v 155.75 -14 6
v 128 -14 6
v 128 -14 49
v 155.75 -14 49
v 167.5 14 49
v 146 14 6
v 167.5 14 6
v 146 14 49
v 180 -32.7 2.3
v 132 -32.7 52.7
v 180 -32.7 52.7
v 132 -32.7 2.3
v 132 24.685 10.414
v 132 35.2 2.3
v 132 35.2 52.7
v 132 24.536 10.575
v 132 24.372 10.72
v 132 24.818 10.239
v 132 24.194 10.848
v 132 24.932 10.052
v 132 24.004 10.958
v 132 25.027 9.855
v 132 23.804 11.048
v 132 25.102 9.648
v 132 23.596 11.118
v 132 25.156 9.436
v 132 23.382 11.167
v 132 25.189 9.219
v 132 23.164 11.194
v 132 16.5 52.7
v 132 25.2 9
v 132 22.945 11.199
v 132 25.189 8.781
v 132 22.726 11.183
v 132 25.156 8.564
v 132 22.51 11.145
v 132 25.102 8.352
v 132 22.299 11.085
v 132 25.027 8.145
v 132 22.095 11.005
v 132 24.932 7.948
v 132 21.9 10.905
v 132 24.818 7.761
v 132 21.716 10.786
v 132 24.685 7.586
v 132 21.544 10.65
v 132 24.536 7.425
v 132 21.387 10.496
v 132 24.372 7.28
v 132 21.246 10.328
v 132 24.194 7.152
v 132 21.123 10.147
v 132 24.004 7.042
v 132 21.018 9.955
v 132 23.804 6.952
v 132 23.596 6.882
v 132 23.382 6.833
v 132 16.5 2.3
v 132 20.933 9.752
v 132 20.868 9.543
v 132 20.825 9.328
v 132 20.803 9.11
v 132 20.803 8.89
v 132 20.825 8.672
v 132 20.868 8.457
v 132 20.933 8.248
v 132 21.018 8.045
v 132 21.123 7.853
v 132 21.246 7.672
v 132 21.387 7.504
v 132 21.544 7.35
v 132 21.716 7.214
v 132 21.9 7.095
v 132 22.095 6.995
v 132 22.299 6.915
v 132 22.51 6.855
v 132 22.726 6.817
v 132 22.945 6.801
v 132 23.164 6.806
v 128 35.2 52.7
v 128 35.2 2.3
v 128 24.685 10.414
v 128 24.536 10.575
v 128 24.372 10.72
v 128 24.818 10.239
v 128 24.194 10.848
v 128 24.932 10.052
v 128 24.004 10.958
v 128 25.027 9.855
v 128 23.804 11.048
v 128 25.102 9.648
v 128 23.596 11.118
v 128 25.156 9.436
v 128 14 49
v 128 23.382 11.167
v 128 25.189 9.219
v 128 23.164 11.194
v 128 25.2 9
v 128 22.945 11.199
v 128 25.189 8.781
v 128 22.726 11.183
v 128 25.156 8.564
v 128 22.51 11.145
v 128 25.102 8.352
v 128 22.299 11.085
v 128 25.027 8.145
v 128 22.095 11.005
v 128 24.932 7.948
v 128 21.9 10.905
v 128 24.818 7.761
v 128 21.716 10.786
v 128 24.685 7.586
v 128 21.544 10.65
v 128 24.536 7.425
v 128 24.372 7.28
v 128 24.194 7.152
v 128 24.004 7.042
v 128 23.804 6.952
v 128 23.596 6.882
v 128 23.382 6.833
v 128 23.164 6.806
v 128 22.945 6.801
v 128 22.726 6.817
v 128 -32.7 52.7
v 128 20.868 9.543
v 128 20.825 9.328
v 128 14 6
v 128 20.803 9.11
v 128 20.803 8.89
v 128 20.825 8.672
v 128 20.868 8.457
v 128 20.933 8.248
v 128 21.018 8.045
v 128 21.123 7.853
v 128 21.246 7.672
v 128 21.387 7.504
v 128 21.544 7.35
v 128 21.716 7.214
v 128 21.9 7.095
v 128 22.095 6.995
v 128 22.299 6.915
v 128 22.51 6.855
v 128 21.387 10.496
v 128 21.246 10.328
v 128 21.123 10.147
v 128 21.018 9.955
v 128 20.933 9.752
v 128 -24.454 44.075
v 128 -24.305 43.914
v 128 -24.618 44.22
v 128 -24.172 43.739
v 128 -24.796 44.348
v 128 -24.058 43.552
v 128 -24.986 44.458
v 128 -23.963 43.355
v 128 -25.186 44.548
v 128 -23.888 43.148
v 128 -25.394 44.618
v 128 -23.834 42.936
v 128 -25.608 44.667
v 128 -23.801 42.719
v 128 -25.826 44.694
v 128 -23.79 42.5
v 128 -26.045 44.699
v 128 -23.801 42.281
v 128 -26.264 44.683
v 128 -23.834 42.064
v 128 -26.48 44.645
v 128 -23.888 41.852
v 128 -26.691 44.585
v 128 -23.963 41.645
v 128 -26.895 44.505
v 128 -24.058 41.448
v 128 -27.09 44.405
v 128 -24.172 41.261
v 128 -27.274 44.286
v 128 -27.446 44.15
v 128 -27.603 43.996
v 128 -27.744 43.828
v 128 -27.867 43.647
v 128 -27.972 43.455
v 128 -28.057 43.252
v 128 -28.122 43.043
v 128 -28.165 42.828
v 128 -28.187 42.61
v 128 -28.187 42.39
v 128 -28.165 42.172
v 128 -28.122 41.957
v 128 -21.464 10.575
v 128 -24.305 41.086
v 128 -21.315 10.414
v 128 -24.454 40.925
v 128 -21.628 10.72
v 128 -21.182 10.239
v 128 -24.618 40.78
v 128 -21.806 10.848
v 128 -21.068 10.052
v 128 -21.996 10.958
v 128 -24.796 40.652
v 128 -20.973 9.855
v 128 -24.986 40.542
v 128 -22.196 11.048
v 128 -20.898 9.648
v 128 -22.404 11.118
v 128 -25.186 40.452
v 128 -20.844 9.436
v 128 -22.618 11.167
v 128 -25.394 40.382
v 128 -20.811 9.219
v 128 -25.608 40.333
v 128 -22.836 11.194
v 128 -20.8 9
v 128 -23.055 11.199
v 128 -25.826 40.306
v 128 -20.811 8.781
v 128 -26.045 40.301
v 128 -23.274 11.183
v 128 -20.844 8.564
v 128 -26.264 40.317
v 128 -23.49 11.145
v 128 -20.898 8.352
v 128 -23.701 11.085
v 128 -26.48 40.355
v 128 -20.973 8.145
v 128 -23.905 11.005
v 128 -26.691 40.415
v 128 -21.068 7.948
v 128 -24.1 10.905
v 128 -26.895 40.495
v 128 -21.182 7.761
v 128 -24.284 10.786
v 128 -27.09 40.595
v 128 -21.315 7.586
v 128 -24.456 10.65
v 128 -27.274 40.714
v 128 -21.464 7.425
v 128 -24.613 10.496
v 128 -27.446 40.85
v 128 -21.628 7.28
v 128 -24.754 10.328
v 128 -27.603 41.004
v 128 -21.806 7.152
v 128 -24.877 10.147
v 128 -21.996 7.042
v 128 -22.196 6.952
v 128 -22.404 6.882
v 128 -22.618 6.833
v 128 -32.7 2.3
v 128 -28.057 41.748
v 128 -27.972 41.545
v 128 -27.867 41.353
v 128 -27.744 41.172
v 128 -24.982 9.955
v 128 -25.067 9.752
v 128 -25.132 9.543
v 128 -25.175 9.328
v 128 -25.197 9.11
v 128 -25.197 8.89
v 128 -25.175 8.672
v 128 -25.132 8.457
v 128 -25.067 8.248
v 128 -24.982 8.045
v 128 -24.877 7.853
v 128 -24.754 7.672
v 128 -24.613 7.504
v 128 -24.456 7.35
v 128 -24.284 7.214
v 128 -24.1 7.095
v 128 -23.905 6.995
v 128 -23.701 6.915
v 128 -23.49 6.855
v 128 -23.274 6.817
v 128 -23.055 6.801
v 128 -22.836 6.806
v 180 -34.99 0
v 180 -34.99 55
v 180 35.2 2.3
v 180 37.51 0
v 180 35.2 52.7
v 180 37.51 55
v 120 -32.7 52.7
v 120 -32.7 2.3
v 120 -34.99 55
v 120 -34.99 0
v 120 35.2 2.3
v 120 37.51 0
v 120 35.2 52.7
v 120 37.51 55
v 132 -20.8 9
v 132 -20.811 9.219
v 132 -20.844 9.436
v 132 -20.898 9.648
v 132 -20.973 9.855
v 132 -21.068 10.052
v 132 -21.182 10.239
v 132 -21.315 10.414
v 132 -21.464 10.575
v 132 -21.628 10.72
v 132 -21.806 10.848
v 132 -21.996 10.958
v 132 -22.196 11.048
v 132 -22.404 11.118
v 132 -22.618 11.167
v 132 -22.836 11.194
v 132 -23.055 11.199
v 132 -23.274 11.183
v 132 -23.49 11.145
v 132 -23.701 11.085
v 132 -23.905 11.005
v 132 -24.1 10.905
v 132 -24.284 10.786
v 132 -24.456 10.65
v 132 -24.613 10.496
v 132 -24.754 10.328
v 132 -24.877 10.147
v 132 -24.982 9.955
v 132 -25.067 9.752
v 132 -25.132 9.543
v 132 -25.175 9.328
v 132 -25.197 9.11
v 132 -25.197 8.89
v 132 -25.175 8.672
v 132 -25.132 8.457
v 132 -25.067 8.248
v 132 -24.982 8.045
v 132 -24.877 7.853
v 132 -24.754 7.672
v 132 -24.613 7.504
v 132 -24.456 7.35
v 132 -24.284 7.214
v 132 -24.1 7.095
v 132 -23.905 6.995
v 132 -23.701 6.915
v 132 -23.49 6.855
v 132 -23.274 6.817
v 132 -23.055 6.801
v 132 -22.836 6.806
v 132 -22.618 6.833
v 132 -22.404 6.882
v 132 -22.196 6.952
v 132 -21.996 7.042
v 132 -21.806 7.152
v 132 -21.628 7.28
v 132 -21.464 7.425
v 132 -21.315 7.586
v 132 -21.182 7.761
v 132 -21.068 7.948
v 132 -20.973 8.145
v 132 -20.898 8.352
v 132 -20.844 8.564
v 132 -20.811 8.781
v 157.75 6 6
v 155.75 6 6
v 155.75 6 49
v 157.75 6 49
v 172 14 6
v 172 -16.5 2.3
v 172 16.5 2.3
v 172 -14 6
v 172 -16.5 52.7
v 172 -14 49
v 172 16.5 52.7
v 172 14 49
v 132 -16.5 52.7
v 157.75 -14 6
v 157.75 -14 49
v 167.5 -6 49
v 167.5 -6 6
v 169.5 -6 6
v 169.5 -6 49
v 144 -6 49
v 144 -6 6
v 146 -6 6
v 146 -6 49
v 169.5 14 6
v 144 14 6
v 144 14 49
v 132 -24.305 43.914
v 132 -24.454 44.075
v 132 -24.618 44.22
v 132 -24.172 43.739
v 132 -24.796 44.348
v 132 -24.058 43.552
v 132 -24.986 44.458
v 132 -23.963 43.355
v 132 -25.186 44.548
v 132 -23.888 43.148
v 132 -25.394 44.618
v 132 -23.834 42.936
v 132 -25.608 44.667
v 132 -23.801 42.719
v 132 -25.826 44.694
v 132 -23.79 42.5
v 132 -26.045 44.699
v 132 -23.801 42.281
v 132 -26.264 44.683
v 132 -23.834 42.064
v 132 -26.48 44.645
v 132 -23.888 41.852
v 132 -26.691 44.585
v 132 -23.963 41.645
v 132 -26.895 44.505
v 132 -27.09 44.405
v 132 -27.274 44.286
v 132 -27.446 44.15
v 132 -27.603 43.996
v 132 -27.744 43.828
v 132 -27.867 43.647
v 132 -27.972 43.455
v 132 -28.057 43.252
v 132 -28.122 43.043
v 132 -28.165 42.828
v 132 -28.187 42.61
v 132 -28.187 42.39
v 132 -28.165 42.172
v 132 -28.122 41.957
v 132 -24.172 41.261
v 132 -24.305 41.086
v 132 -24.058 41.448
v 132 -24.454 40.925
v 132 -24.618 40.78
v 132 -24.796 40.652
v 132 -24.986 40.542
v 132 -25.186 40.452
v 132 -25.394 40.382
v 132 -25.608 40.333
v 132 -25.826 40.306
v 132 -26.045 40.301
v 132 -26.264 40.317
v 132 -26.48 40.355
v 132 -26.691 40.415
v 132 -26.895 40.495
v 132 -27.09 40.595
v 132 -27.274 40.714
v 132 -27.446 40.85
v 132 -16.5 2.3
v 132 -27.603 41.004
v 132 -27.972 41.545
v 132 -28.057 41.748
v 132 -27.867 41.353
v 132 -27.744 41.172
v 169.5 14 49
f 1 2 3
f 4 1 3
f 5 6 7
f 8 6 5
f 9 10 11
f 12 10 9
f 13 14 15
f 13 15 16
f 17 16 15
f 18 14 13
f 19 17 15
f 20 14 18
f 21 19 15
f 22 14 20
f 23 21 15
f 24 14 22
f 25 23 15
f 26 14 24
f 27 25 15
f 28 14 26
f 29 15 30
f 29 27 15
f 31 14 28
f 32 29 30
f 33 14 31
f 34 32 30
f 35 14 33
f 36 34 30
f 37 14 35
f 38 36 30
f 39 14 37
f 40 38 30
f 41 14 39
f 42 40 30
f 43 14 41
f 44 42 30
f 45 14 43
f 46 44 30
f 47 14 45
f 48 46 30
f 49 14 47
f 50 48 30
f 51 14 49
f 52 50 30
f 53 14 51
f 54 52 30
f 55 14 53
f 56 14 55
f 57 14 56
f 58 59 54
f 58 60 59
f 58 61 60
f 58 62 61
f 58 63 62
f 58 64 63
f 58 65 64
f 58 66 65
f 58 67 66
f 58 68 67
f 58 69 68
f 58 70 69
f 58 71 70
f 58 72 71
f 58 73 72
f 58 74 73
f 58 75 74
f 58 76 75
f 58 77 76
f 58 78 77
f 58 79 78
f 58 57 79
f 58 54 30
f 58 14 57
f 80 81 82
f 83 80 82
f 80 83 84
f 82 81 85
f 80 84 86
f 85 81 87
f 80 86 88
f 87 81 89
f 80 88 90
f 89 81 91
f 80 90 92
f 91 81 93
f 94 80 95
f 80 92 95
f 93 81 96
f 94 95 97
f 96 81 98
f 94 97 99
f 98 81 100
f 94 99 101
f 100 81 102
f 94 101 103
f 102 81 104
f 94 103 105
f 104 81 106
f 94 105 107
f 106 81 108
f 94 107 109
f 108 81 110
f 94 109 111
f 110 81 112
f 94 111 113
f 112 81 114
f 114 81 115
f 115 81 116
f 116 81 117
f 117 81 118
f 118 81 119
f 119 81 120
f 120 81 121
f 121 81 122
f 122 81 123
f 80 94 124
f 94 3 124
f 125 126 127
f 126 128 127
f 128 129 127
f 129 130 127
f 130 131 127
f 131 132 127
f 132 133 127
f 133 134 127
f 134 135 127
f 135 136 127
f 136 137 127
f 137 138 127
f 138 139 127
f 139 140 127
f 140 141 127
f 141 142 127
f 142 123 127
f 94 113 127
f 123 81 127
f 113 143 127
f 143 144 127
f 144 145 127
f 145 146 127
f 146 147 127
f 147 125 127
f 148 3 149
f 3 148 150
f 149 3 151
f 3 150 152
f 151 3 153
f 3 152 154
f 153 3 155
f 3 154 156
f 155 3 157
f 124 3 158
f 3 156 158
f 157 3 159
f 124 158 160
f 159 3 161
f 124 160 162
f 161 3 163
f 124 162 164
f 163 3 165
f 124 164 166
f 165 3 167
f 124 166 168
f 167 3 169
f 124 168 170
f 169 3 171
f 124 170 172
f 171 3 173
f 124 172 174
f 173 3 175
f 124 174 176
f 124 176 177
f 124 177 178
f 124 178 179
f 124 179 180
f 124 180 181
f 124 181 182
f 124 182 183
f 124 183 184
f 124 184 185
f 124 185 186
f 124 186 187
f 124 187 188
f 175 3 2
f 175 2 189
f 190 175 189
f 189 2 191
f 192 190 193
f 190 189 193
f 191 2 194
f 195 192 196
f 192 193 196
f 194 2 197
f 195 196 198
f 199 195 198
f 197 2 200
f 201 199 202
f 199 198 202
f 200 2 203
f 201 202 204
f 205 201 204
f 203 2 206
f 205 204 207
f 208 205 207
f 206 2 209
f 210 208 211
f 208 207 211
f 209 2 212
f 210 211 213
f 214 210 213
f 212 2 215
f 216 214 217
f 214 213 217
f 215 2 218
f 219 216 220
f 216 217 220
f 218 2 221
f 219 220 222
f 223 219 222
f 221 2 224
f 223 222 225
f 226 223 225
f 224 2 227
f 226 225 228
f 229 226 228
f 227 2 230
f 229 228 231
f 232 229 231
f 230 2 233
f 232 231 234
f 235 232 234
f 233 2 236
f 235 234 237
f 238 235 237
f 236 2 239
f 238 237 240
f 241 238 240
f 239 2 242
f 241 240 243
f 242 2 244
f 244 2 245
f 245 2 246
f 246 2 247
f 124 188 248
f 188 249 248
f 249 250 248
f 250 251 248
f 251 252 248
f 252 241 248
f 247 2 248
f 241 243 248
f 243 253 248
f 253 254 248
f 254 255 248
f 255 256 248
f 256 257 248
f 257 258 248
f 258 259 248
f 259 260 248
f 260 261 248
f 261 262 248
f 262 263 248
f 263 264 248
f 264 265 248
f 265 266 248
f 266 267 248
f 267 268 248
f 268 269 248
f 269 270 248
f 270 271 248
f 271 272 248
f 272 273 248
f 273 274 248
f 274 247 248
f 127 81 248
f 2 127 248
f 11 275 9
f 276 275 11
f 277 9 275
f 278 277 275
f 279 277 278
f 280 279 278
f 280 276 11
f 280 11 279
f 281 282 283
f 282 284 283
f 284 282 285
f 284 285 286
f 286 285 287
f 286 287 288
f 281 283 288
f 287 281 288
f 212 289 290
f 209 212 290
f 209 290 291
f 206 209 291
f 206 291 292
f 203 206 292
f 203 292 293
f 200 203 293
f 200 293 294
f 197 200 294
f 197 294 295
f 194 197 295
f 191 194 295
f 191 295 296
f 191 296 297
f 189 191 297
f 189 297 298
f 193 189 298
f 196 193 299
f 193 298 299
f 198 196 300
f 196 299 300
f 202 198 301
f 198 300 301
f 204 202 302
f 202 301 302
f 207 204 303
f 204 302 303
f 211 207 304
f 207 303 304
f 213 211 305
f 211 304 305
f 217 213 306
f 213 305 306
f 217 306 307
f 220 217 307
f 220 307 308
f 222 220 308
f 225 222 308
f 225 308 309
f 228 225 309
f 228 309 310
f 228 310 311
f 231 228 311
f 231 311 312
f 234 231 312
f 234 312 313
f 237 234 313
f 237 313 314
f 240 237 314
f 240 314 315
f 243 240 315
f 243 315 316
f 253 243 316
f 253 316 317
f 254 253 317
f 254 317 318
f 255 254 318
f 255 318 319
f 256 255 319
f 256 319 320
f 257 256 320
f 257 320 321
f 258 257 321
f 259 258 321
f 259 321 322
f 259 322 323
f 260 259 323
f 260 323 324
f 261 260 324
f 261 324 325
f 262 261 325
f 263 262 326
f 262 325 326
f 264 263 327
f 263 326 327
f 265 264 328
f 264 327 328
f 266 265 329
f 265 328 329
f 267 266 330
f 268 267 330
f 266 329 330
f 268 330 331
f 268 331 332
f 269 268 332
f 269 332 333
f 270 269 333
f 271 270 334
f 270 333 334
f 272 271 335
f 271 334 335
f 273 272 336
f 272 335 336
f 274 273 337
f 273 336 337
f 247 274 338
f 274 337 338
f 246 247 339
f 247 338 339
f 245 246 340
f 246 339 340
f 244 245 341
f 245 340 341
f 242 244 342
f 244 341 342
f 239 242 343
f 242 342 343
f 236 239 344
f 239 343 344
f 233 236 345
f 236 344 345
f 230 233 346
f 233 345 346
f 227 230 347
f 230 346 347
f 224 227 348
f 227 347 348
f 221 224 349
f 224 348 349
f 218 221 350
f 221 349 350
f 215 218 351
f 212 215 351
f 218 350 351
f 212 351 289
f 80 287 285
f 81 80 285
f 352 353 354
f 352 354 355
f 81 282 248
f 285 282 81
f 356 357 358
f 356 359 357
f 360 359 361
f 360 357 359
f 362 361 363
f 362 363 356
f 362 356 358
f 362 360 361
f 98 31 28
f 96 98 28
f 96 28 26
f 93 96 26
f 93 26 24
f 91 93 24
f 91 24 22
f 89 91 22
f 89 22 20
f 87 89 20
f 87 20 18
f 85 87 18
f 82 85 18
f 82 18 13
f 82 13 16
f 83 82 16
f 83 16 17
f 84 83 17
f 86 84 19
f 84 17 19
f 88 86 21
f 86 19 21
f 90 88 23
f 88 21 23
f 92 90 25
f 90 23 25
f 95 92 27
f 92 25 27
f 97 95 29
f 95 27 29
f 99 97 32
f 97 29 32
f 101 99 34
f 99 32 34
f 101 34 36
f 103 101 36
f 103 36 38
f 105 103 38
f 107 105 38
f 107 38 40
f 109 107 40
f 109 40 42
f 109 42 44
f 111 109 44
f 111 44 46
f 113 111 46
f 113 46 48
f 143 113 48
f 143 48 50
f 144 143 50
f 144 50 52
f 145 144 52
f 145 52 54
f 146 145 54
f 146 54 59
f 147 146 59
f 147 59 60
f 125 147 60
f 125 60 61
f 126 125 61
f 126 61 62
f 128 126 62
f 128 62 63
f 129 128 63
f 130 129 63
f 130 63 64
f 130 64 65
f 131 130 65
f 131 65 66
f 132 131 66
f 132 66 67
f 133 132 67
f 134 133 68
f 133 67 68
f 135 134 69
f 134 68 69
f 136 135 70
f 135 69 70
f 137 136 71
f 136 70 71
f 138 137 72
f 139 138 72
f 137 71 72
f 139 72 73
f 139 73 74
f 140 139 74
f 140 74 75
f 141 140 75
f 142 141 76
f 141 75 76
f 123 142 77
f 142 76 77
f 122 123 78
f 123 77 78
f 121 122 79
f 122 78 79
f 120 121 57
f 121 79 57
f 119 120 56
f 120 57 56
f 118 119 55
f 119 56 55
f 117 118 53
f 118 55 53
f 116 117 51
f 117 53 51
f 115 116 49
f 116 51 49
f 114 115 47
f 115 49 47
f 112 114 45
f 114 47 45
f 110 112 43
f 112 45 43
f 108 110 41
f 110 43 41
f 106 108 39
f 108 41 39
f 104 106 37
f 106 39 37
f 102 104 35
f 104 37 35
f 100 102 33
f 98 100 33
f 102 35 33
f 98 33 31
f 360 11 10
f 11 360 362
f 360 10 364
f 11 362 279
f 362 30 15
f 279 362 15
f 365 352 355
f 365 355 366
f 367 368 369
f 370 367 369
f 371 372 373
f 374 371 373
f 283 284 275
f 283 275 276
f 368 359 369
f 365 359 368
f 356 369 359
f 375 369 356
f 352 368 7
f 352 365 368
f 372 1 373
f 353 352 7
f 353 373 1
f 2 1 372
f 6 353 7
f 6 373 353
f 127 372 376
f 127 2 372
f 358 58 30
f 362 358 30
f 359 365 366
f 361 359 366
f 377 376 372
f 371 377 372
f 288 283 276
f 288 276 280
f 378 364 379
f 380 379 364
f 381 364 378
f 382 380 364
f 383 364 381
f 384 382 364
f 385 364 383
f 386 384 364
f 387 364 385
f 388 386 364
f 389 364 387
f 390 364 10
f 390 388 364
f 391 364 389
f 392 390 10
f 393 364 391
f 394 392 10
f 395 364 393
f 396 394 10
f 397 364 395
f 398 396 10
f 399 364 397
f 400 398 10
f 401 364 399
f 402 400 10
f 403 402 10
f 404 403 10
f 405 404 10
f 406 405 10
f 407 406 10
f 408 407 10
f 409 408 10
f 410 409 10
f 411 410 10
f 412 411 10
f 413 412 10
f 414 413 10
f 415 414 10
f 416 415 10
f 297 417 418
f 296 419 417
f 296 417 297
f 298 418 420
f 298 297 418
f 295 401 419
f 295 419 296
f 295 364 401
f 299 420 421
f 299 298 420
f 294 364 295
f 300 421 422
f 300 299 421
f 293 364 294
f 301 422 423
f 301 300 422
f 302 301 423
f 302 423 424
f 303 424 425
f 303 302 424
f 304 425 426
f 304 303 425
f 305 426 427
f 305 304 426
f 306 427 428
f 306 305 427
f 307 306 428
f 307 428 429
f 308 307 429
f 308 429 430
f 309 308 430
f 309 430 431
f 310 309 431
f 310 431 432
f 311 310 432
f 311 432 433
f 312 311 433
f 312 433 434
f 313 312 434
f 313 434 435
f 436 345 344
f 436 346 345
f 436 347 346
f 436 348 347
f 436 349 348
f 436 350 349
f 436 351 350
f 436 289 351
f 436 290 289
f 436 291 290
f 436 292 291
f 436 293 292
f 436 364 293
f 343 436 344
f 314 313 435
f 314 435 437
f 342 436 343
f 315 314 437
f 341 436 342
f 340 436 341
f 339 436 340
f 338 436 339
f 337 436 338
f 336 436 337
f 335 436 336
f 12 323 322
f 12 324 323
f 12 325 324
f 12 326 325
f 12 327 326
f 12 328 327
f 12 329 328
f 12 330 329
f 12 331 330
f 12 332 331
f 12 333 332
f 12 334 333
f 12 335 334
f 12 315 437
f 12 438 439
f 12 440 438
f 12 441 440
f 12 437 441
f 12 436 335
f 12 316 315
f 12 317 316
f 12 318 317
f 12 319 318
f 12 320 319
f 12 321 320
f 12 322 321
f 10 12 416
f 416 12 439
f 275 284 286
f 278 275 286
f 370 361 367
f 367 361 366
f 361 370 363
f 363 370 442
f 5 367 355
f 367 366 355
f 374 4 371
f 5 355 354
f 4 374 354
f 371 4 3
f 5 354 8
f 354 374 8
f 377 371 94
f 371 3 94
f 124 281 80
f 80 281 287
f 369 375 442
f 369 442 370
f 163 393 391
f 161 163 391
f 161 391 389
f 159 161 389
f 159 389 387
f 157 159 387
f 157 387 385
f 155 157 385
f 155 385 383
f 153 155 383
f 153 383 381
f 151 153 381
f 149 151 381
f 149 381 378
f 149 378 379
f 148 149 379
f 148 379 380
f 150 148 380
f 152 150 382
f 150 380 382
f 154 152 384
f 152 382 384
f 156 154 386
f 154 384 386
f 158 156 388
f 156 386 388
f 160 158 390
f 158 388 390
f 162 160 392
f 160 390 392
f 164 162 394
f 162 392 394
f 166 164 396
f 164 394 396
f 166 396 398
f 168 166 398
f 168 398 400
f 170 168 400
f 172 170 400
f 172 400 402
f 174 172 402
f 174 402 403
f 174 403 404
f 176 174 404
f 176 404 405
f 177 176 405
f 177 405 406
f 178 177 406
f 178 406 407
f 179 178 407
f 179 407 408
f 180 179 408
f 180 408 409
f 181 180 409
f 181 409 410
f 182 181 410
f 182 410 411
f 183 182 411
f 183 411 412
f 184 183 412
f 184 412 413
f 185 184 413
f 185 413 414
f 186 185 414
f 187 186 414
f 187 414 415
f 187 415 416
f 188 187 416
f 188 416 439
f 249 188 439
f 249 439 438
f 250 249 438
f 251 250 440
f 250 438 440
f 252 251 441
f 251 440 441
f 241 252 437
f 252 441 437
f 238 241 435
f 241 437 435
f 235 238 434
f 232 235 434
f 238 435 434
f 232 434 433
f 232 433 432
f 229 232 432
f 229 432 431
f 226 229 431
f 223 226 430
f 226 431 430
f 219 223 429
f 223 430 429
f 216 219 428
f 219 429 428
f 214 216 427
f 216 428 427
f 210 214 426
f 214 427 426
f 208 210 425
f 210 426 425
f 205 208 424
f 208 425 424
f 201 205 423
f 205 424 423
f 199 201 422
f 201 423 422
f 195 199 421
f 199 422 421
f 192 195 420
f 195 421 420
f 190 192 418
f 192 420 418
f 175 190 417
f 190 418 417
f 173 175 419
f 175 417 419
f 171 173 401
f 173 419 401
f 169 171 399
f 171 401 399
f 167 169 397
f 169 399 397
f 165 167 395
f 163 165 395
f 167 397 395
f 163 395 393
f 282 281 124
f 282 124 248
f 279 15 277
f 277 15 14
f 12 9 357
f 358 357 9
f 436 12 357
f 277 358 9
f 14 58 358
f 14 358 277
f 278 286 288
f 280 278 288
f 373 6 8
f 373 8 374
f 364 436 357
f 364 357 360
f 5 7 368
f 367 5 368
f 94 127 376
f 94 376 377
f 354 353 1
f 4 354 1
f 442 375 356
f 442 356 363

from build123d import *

# Parameters (mm, degrees)
SKETCH037_W     = 72.5
SKETCH037_H     = 55
PAD018_DEPTH    = 60
SKETCH038_W     = 67.9
SKETCH038_H     = 50.4
POCKET013_DEPTH = 60.001
SKETCH039_W     = 67.9
SKETCH039_H     = 4
PAD019_DEPTH    = 50.4
SKETCH040_R     = 2.2
HOLE006_DEPTH   = 25
SKETCH041_W     = 28
SKETCH041_H     = 43
POCKET014_DEPTH = 4
SKETCH042_W     = 33
SKETCH042_H     = 50.4
SKETCH042_W_2   = 28
SKETCH042_H_2   = 43
PAD020_DEPTH    = 40
SKETCH043_W     = 20
SKETCH043_H     = 2
PAD021_DEPTH    = 43


with BuildPart() as part:
    # Sketch037 → Pad018 (new body)
    with BuildSketch(Plane.YZ.offset(120)):
        with Locations((1.26, 27.5)):
            Rectangle(SKETCH037_W, SKETCH037_H)
    extrude(amount=PAD018_DEPTH)

    # Sketch038 (on Face5 of Pad018) → Pocket013 (cut, through all)
    with BuildSketch(Plane(origin=(120, 0, 0), x_dir=(0, 1, 0), z_dir=(-1, 0, 0))):
        with Locations((1.25, -27.5)):
            Rectangle(SKETCH038_W, SKETCH038_H)
    extrude(amount=-POCKET013_DEPTH, mode=Mode.SUBTRACT)

    # Sketch039 (on Face8 of Pocket013) → Pad019 (join)
    with BuildSketch(Plane(origin=(0, 0, 2.3), x_dir=(0, -1, 0), z_dir=(0, 0, 1))):
        with Locations((-1.25, 130)):
            Rectangle(SKETCH039_W, SKETCH039_H)
    extrude(amount=PAD019_DEPTH)

    # Sketch040 (on Face16 of Pad019) → Hole006 (cut)
    with BuildSketch(Plane.YZ.offset(132)):
        with Locations((-25.99, 42.5)):
            Circle(SKETCH040_R)
        with Locations((-23, 9)):
            Circle(SKETCH040_R)
        with Locations((23, 9)):
            Circle(SKETCH040_R)
    extrude(amount=-HOLE006_DEPTH, mode=Mode.SUBTRACT)

    # Sketch041 (on Face16 of Hole006) → Pocket014 (cut)
    with BuildSketch(Plane.YZ.offset(132)):
        with Locations((0, 27.5)):
            Rectangle(SKETCH041_W, SKETCH041_H)
    extrude(amount=-POCKET014_DEPTH, mode=Mode.SUBTRACT)

    # Sketch042 (on Face16 of Pocket014) → Pad020 (join)
    with BuildSketch(Plane.YZ.offset(132)):
        with Locations((0, 27.5)):
            Rectangle(SKETCH042_W, SKETCH042_H)
        with Locations((0, 27.5)):
            Rectangle(SKETCH042_W_2, SKETCH042_H_2, mode=Mode.SUBTRACT)
    extrude(amount=PAD020_DEPTH)

    # Sketch043 (on Face29 of Pad020) → Pad021 (join)
    with BuildSketch(Plane(origin=(0, 0, 6), x_dir=(0, -1, 0), z_dir=(0, 0, 1))):
        with Locations((-4, 168.5)):
            Rectangle(SKETCH043_W, SKETCH043_H)
        with Locations((4, 156.75)):
            Rectangle(SKETCH043_W, SKETCH043_H)
        with Locations((-4, 145)):
            Rectangle(SKETCH043_W, SKETCH043_H)
    extrude(amount=PAD021_DEPTH)


solid = part.part
